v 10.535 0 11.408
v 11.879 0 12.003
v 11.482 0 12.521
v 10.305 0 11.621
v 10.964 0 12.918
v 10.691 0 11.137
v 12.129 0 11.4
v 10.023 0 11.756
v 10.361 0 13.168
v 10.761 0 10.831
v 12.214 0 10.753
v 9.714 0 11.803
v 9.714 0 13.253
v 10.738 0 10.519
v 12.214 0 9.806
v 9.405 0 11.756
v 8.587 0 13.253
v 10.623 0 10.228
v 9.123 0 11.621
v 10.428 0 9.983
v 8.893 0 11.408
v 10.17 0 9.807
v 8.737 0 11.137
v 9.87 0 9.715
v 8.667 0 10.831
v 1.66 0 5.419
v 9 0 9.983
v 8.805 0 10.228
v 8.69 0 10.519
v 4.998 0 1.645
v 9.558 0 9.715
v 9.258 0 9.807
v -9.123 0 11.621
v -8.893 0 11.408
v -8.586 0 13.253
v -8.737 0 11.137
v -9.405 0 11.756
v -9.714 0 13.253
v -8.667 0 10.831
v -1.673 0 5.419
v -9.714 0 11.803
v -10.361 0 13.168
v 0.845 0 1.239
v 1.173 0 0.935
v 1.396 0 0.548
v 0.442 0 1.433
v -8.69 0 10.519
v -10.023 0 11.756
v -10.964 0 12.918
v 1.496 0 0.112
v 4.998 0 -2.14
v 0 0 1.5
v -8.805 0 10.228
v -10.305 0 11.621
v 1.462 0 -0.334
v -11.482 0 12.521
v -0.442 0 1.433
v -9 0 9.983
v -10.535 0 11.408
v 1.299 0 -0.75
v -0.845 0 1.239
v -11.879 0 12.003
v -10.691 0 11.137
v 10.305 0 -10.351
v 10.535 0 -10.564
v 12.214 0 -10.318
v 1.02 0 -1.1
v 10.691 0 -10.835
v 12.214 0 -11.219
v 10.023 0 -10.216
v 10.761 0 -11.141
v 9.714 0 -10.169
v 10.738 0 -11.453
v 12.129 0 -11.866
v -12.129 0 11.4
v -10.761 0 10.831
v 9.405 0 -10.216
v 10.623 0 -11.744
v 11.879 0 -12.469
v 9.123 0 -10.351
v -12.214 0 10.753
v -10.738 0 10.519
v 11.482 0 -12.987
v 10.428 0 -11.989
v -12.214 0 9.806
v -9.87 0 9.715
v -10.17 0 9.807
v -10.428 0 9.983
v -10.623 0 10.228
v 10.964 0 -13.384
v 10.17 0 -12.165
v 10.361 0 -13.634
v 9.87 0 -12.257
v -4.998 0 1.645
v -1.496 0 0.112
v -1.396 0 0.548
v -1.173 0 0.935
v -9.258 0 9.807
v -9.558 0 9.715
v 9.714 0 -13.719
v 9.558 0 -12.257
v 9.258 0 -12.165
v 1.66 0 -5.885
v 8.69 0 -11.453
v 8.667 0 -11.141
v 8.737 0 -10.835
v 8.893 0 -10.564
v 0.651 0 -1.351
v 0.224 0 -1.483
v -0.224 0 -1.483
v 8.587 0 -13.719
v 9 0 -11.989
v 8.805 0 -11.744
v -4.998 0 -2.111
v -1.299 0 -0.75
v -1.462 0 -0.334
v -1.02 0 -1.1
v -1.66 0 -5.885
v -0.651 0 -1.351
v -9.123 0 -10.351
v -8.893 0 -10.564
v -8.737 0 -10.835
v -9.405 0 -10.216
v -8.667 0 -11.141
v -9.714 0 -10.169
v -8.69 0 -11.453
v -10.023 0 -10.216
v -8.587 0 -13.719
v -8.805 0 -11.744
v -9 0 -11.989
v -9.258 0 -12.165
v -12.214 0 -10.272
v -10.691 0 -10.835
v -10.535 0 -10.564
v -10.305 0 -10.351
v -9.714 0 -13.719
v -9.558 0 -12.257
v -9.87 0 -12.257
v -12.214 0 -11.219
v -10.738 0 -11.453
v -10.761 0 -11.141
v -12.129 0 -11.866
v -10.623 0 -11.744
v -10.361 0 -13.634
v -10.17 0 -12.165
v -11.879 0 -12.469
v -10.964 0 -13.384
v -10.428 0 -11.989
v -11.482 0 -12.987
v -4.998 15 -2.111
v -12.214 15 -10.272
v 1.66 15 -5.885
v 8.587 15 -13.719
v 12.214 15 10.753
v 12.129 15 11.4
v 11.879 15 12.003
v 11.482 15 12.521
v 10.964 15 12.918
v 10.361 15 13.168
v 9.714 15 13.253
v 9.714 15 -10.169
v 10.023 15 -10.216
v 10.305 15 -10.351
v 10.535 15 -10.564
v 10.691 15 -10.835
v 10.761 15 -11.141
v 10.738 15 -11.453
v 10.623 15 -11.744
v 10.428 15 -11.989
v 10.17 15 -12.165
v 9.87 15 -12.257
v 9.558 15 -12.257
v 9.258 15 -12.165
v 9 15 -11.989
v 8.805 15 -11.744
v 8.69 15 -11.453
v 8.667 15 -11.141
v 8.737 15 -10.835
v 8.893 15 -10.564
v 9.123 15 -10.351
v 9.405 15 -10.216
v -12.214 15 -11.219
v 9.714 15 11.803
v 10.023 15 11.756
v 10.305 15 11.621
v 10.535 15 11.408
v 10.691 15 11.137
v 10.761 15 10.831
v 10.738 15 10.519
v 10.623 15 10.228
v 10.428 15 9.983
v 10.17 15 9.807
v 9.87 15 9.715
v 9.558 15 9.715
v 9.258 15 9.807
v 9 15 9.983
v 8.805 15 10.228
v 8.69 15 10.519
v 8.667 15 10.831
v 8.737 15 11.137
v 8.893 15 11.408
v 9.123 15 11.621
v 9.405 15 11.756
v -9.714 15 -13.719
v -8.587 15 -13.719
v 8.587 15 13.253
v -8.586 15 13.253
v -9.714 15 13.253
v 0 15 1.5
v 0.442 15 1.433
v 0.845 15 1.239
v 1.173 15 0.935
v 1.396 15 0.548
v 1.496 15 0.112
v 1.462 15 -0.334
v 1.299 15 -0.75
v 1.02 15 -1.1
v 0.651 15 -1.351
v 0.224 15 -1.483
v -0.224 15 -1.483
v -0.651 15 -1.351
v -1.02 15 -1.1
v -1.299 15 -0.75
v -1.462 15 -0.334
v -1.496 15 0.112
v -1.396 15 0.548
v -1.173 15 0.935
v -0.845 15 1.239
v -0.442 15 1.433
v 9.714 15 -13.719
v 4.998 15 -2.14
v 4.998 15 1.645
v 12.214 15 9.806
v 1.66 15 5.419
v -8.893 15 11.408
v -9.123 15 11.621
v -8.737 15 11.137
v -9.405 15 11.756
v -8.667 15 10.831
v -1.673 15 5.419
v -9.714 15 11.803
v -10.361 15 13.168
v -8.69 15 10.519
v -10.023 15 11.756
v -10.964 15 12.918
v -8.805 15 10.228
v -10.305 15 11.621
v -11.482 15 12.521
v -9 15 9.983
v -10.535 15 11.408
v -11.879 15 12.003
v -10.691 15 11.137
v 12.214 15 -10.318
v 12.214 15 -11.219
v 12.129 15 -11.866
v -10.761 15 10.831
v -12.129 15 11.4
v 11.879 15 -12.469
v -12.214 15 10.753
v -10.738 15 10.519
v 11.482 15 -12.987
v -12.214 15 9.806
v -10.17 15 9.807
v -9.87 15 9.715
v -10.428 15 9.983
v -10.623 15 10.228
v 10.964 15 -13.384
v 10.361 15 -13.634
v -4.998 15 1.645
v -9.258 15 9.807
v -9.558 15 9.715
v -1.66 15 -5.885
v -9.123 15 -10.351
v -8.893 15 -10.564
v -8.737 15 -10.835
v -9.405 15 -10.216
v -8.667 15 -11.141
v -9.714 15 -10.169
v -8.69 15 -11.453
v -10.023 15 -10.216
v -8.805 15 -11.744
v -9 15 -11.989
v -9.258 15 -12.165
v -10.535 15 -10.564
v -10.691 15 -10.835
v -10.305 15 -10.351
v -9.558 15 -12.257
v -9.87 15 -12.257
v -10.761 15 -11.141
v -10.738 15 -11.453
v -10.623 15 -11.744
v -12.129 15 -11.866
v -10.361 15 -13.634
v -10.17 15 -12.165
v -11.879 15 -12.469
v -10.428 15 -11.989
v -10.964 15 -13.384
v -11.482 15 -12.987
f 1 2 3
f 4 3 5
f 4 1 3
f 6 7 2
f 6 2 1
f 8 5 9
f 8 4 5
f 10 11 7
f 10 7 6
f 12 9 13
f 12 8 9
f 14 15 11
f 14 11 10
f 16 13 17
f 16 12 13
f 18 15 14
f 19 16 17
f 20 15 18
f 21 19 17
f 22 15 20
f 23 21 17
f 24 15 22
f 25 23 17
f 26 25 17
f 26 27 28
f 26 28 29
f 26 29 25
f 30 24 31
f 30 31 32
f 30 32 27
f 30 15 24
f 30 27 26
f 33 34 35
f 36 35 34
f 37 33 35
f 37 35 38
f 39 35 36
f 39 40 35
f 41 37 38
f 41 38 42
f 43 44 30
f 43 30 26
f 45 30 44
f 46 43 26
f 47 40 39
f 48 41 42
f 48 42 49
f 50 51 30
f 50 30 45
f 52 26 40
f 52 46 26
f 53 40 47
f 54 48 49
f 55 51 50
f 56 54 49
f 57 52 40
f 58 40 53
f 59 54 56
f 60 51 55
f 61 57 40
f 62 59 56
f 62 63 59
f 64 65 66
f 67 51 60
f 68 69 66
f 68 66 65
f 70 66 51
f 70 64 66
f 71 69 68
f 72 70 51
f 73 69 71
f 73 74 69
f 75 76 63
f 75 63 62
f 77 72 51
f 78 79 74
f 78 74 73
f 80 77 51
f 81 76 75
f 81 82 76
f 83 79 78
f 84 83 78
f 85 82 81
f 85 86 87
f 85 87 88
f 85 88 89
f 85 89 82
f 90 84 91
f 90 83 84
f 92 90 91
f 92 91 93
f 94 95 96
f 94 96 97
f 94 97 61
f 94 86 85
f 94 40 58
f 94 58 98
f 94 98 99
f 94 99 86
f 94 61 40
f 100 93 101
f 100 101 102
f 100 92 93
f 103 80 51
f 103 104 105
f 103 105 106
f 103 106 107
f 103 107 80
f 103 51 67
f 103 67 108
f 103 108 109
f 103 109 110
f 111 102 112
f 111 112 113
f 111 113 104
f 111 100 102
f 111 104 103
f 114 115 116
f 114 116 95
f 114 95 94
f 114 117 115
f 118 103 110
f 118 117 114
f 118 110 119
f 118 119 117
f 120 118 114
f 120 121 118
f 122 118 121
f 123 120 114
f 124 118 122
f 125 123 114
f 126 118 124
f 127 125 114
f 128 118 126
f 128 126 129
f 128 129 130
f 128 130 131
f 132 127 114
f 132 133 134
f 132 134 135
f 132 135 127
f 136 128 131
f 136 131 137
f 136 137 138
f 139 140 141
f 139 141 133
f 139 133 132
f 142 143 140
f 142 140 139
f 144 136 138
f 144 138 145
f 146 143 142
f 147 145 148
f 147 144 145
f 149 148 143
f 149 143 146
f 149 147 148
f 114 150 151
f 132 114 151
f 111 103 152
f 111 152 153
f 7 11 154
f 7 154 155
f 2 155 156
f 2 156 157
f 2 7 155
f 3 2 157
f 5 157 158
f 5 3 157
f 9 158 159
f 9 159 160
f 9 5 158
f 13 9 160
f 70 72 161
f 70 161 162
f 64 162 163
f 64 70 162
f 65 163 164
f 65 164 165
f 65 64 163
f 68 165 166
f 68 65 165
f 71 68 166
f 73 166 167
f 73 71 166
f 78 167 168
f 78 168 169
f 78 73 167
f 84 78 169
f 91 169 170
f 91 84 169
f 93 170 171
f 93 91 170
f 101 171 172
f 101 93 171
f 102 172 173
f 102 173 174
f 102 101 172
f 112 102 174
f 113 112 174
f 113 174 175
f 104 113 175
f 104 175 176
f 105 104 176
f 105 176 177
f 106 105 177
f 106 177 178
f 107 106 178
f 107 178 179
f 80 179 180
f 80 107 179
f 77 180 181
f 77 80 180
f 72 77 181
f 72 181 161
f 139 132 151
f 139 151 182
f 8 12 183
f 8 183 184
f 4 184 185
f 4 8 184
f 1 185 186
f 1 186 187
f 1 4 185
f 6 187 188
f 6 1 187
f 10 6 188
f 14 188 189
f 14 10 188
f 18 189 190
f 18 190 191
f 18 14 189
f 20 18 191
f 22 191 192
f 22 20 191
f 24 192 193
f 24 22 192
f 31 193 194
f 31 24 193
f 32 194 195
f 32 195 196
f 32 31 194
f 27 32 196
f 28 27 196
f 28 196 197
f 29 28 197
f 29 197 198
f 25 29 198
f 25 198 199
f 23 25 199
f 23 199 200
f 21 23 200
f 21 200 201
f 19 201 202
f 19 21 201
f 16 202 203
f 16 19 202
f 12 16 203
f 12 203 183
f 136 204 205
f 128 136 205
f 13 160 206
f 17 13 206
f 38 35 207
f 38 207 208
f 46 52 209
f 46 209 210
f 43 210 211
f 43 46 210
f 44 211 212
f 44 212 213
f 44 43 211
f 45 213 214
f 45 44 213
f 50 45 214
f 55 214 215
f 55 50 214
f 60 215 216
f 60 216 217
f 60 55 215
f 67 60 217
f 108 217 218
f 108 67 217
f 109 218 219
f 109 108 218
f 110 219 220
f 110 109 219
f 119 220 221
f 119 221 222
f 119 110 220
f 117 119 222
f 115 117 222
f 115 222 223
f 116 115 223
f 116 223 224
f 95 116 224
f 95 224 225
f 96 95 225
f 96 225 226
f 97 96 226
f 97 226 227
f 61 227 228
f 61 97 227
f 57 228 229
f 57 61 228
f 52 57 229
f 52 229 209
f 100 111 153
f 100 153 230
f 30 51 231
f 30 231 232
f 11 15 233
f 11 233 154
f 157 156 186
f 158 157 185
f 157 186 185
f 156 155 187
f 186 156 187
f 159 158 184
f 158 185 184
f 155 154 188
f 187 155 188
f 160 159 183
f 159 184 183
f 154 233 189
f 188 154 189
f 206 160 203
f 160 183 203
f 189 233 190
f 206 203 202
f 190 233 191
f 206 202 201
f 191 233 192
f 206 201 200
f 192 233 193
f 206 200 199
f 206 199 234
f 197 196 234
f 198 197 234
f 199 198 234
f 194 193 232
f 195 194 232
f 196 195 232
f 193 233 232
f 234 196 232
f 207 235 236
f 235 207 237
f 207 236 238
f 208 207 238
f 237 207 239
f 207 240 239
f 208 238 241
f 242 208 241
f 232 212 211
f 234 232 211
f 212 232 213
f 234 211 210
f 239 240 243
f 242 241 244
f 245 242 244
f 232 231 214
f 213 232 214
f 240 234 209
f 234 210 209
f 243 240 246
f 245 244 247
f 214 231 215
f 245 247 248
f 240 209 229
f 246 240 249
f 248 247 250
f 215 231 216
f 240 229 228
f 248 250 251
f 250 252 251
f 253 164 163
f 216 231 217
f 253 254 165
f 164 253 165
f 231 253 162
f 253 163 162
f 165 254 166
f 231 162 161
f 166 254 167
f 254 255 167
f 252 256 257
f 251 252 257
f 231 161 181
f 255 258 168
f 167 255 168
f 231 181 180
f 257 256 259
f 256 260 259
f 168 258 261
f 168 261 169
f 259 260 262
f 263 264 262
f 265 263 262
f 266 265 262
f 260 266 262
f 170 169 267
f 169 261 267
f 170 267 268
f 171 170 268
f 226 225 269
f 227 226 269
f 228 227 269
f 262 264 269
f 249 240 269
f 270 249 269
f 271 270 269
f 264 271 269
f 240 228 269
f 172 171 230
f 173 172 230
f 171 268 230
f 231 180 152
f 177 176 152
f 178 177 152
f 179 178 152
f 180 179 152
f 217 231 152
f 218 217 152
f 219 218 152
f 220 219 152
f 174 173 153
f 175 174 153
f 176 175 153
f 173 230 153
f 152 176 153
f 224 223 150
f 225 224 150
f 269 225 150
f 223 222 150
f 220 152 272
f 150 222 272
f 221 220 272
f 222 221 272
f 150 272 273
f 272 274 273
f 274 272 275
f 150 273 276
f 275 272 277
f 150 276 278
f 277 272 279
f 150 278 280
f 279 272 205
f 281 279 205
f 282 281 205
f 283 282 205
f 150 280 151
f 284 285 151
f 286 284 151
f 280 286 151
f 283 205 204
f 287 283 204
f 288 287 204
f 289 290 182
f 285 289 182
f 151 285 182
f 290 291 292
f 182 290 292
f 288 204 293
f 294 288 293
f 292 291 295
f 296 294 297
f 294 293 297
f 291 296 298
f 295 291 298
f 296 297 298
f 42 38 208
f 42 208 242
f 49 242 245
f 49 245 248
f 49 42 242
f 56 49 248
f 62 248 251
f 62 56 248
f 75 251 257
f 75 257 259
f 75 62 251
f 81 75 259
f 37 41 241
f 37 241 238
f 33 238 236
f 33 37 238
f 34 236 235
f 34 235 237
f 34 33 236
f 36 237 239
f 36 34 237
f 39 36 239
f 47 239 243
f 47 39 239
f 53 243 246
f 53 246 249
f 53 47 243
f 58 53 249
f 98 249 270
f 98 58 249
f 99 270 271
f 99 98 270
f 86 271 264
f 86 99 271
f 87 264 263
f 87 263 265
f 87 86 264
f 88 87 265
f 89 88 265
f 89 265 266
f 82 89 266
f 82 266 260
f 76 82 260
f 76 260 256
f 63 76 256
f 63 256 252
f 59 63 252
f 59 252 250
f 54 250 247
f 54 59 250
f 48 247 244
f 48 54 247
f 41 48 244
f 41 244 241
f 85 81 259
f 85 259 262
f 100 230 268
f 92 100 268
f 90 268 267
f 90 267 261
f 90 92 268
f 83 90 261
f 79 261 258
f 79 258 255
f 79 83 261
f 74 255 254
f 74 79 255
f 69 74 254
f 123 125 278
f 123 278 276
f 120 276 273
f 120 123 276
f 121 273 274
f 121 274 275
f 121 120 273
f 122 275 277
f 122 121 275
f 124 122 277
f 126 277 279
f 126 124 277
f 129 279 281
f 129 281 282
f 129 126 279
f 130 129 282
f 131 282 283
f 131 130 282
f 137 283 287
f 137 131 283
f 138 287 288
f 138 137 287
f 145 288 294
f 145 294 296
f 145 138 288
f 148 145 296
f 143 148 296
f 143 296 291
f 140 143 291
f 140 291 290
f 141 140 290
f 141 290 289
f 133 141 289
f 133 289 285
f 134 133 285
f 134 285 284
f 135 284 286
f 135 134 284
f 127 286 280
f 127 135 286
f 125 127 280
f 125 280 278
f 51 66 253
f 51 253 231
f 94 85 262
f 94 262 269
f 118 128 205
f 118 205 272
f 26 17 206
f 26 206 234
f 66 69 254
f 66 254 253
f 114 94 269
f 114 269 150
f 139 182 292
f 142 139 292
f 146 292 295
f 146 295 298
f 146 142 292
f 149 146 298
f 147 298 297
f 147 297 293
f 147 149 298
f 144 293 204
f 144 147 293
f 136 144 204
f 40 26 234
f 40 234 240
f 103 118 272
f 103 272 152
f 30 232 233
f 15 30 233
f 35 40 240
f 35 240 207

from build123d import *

# Parameters (mm, degrees)
SKETCH_1_R      = 1.05
SKETCH_1_R_2    = 1.5
EXTRUDE_3_DEPTH = 15


with BuildPart() as part:
    # 草图1 → 凸台-拉伸3 (new body)
    with BuildSketch(Plane(origin=(0, 0, 0), x_dir=(1, 0, 0), z_dir=(0, 1, 0))):
        with BuildLine():
            Line((-4.997530566, 2.110812699), (-12.214, 10.272242924))
            Line((-12.214, 10.272242924), (-12.214, 11.219))
            ThreePointArc((-12.214, 11.219), (-11.481766953, 12.986766953), (-9.714, 13.719))
            Line((-9.714, 13.719), (-8.587402673, 13.719))
            Line((-8.587402673, 13.719), (-1.66039255, 5.884932345))
            Line((-1.66039255, 5.884932345), (1.66039255, 5.884932345))
            Line((1.66039255, 5.884932345), (8.587402672, 13.719))
            Line((8.587402672, 13.719), (9.714, 13.719))
            ThreePointArc((9.714, 13.719), (11.481766953, 12.986766953), (12.214, 11.219))
            Line((12.214, 11.219), (12.214, 10.317530105))
            Line((12.214, 10.317530105), (4.997530566, 2.139803462))
            Line((4.997530566, 2.139803462), (4.997530566, -1.644812699))
            Line((4.997530566, -1.644812699), (12.214, -9.806242924))
            Line((12.214, -9.806242924), (12.214, -10.753))
            ThreePointArc((12.214, -10.753), (11.481766953, -12.520766953), (9.714, -13.253))
            Line((9.714, -13.253), (8.587402673, -13.253))
            Line((8.587402673, -13.253), (1.66039255, -5.418932345))
            Line((1.66039255, -5.418932345), (-1.672707789, -5.418932345))
            Line((-1.672707789, -5.418932345), (-8.585913897, -13.253))
            Line((-8.585913897, -13.253), (-9.714, -13.253))
            ThreePointArc((-9.714, -13.253), (-11.481766953, -12.520766953), (-12.214, -10.753))
            Line((-12.214, -10.753), (-12.214, -9.806242924))
            Line((-12.214, -9.806242924), (-4.997530566, -1.644812699))
            Line((-4.997530566, -1.644812699), (-4.997530566, 2.110812699))
        make_face()
        with Locations(Location((-9.714, 11.219, 0), (0, 0, 270))):
            Circle(SKETCH_1_R, mode=Mode.SUBTRACT)
        with Locations(Location((9.714, 11.219, 0), (0, 0, 270))):
            Circle(SKETCH_1_R, mode=Mode.SUBTRACT)
        with Locations(Location((-9.714, -10.753, 0), (0, 0, 270))):
            Circle(SKETCH_1_R, mode=Mode.SUBTRACT)
        with Locations(Location((9.714, -10.753, 0), (0, 0, 270))):
            Circle(SKETCH_1_R, mode=Mode.SUBTRACT)
        with Locations(Location((0, 0, 0), (0, 0, 270))):
            Circle(SKETCH_1_R_2, mode=Mode.SUBTRACT)
    extrude(amount=EXTRUDE_3_DEPTH)


solid = part.part
